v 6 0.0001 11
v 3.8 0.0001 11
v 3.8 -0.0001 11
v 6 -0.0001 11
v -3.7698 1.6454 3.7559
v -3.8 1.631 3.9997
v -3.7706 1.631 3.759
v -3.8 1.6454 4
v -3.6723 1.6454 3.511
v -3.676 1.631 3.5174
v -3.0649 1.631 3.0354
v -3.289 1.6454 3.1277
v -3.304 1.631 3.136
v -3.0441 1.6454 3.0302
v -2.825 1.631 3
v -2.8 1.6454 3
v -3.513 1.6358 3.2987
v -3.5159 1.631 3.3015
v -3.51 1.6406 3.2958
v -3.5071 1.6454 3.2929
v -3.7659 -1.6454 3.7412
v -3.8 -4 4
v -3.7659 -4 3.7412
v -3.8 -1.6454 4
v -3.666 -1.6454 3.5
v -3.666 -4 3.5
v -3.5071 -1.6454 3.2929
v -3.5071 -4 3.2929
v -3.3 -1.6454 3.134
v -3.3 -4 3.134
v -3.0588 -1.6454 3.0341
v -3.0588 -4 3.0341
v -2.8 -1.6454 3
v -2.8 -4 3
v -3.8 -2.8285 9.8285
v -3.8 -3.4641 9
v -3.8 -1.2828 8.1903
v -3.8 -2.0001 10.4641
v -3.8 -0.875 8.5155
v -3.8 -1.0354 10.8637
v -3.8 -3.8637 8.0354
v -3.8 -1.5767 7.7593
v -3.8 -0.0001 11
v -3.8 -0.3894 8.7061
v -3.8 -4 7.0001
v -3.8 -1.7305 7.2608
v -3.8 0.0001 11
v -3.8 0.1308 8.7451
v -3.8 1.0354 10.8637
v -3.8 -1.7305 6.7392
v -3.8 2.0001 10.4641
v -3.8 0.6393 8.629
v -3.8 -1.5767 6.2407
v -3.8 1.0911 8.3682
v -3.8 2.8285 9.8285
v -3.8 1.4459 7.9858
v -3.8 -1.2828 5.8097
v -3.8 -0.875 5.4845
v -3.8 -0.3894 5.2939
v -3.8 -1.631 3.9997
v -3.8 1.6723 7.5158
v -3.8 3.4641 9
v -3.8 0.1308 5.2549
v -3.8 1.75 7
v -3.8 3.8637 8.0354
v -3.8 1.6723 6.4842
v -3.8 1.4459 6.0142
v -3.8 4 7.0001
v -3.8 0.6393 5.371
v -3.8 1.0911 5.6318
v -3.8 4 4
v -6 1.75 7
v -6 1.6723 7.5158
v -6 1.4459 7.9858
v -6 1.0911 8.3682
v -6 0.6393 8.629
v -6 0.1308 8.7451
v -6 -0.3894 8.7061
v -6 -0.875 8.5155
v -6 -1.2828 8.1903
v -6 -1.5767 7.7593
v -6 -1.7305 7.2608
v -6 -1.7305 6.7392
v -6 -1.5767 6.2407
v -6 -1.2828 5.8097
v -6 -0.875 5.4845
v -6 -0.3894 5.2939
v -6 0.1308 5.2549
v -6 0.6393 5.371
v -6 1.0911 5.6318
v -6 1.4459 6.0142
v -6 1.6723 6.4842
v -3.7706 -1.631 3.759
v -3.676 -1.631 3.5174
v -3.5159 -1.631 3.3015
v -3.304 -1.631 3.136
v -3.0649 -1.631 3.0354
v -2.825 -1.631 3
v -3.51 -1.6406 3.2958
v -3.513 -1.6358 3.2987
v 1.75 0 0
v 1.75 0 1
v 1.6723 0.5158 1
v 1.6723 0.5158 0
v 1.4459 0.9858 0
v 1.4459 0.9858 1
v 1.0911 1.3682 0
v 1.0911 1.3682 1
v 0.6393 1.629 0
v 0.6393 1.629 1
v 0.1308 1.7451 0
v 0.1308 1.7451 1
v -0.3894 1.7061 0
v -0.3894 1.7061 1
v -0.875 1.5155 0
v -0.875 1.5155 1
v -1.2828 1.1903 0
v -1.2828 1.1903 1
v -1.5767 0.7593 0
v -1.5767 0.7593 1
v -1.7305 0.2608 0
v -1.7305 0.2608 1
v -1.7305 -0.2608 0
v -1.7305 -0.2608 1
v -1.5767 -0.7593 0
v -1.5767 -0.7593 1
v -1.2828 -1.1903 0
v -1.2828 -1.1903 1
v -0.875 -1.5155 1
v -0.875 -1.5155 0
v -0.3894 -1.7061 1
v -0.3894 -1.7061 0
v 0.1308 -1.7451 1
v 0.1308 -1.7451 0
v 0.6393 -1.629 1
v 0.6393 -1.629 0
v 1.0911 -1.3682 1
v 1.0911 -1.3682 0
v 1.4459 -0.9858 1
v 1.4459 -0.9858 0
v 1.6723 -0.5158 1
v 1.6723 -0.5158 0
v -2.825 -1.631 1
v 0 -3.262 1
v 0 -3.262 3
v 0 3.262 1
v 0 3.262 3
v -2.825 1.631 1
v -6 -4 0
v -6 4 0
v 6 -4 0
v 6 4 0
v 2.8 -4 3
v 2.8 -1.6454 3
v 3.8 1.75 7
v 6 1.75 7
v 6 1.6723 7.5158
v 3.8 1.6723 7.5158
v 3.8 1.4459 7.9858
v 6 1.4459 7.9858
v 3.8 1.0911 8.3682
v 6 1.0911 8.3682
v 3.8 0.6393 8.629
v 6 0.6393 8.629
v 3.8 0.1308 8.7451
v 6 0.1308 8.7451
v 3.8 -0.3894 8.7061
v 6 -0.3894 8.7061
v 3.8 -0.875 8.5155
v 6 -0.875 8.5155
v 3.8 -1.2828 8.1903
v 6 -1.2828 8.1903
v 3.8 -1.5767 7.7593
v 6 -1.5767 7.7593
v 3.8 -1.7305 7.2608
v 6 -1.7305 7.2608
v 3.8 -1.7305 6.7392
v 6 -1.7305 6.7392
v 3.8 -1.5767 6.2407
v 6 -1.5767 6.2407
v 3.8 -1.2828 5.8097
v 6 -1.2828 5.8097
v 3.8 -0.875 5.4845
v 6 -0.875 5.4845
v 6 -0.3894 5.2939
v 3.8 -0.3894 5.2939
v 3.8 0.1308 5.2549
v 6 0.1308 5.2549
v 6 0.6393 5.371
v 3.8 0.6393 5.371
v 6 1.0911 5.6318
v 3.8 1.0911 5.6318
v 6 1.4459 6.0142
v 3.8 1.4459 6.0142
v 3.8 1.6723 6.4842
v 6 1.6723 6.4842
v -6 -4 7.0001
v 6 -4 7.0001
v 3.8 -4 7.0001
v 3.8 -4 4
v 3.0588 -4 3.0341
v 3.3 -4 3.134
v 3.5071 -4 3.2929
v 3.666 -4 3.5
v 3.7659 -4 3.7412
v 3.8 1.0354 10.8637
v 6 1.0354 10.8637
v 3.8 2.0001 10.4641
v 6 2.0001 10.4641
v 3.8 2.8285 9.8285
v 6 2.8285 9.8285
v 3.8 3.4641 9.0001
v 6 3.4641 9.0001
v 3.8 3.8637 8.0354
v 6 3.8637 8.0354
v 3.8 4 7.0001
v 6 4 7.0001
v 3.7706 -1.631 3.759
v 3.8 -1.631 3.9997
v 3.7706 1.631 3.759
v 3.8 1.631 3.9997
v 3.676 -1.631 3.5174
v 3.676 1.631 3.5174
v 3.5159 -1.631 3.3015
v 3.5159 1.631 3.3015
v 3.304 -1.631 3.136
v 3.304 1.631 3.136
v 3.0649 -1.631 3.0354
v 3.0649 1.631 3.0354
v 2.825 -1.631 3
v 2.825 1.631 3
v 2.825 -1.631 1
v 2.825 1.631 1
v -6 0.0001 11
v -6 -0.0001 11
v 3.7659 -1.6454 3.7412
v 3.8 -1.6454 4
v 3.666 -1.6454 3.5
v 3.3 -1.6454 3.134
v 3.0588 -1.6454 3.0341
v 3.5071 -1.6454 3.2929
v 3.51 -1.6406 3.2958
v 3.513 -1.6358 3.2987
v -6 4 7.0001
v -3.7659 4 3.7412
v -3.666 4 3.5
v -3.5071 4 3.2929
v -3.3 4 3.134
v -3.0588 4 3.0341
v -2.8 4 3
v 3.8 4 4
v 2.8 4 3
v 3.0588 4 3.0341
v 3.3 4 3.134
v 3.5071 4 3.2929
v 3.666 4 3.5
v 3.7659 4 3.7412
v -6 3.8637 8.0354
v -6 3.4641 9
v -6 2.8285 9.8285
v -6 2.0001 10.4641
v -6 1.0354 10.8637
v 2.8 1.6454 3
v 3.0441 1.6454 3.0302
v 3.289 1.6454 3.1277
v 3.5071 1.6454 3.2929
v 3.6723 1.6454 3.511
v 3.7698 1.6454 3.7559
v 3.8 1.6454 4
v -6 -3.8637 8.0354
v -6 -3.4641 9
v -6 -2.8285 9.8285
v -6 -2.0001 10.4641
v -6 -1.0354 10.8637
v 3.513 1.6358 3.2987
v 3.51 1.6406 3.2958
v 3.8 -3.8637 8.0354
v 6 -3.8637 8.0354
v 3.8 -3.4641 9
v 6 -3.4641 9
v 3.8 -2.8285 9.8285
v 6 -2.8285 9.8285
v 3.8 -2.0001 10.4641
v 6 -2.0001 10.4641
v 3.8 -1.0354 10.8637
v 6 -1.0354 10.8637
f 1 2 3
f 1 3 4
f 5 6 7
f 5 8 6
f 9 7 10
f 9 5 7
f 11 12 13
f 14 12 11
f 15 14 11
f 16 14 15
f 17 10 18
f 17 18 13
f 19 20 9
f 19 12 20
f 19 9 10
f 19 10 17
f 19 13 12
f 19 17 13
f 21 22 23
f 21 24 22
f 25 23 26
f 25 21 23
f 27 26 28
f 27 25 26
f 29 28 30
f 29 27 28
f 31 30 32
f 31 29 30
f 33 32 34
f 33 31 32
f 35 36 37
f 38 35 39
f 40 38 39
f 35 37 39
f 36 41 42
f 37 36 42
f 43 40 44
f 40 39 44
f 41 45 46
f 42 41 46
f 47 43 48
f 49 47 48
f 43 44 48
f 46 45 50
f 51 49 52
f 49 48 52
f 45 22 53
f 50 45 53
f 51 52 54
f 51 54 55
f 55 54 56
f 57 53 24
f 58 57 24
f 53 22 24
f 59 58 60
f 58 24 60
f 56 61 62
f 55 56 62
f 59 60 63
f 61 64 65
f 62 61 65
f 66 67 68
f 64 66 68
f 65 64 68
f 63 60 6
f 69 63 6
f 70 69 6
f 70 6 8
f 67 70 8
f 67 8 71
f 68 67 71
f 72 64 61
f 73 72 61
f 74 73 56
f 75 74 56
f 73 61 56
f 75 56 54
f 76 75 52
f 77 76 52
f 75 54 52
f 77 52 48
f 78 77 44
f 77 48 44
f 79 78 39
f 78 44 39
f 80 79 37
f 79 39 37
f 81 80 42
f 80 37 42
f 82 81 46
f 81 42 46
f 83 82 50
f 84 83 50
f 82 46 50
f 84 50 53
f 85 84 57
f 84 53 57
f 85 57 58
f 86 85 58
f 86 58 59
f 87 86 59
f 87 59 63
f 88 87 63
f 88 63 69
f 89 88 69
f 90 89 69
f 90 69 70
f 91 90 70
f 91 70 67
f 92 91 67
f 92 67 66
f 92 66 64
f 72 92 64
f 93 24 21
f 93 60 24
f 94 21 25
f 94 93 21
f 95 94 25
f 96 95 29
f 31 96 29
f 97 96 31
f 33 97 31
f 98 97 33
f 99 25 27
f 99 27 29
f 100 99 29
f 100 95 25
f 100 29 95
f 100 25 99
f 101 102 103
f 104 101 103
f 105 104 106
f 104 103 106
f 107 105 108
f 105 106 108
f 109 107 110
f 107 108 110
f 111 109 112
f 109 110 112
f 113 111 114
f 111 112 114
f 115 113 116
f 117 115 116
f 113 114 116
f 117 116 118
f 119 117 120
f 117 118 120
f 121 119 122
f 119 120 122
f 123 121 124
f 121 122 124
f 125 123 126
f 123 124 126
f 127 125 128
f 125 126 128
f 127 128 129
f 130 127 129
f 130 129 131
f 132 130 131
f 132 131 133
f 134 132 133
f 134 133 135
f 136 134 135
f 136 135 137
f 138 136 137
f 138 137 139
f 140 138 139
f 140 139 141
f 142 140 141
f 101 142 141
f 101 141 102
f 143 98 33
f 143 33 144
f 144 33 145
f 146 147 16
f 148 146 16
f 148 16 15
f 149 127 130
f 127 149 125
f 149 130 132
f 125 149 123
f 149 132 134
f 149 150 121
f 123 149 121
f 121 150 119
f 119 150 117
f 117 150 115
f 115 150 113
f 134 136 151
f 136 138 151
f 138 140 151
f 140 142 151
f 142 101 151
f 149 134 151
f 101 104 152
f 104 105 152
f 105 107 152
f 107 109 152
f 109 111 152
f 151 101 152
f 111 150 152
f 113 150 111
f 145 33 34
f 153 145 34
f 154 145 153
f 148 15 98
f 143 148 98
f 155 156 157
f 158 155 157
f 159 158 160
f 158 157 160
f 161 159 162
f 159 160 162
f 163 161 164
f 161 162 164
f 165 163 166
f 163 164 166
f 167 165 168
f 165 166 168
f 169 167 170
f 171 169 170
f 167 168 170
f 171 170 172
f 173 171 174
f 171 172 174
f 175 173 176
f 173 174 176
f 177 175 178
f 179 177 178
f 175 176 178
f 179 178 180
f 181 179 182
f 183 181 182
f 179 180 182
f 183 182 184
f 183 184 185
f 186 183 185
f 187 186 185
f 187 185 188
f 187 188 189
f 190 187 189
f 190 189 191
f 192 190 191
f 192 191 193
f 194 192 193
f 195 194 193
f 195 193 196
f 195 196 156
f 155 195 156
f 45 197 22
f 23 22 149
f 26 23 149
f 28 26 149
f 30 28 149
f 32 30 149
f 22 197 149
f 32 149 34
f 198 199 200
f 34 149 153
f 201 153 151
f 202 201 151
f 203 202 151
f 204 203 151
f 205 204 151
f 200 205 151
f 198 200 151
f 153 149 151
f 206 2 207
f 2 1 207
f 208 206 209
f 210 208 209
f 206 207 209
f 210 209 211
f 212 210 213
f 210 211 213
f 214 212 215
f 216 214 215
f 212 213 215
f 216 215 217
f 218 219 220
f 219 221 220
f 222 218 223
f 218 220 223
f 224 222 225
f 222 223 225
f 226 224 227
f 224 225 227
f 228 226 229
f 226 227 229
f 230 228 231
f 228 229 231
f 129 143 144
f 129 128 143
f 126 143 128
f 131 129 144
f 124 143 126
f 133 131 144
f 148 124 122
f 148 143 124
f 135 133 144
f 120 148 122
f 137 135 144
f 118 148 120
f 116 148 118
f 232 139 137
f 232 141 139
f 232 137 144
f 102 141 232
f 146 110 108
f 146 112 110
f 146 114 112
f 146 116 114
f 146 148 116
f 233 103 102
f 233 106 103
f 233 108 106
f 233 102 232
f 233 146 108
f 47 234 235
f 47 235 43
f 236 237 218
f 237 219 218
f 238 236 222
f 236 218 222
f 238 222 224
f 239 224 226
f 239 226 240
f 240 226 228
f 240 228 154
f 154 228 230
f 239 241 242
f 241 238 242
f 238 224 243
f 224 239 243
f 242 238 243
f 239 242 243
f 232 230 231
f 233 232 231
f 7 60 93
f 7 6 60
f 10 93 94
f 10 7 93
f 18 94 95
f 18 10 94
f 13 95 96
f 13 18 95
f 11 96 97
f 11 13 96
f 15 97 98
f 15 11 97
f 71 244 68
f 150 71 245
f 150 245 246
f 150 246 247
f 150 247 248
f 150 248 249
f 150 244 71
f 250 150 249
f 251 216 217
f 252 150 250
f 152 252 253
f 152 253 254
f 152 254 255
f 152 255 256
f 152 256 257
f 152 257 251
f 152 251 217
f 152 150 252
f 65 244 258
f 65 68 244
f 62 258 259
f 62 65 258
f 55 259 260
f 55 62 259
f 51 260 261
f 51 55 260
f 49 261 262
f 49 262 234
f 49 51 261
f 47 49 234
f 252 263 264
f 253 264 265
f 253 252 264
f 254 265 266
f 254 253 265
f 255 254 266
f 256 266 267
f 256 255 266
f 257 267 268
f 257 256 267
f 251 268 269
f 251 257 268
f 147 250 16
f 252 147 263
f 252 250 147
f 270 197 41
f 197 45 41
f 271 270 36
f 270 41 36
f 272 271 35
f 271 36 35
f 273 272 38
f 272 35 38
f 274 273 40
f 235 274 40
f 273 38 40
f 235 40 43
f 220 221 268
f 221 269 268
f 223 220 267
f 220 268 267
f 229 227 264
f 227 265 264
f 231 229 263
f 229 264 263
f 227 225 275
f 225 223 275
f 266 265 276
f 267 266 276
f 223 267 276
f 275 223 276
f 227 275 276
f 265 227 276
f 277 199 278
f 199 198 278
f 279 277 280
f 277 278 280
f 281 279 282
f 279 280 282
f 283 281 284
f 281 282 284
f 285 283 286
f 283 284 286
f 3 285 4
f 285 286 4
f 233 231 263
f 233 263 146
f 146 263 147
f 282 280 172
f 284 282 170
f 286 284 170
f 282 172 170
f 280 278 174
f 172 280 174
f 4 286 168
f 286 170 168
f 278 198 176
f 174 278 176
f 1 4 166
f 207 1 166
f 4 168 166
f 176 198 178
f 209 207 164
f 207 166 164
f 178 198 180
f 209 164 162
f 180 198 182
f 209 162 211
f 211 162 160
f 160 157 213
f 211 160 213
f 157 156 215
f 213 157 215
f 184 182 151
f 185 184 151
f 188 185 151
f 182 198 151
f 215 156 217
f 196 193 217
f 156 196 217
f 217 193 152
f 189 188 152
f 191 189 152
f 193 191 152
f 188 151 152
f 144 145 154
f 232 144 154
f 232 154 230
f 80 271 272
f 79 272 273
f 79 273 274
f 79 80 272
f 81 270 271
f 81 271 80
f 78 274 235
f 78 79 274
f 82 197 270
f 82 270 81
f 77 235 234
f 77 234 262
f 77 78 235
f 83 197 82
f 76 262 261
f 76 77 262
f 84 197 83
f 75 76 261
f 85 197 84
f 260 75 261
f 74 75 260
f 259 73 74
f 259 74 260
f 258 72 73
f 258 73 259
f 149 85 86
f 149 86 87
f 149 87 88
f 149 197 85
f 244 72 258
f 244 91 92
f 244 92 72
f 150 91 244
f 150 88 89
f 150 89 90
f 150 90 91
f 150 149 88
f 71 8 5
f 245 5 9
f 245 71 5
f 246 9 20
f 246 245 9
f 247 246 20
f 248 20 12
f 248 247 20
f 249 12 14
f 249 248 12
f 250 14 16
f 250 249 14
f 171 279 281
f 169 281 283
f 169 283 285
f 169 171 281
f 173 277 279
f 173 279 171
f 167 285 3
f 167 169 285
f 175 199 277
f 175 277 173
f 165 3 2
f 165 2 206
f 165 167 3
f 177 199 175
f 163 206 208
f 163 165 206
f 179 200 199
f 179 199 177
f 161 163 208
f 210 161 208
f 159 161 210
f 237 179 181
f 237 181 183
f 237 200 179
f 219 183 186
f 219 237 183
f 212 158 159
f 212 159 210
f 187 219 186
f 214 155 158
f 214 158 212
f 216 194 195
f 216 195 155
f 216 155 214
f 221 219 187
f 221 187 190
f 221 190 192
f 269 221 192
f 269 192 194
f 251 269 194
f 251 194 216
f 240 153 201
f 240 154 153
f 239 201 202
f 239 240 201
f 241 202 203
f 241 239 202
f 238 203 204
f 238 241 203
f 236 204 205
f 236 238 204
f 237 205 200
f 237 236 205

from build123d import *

# Parameters (mm, degrees)
SKETCH_1_W          = 12
SKETCH_1_H          = 8
EXTRUDE_1_DEPTH     = 3
CUT_EXTRUDE_1_DEPTH = 2
SKETCH_3_R          = 1.75
CUT_EXTRUDE_2_DEPTH = 2
SKETCH_4_W          = 2.2
SKETCH_4_H          = 8
EXTRUDE_2_DEPTH     = 8
FILLET_1_R          = 4
SKETCH_5_R          = 1.75
CUT_EXTRUDE_3_DEPTH = 17.763054614
FILLET_2_R          = 1


with BuildPart() as part:
    # Эскиз1 → Бобышка-Вытянуть1 (new body)
    with BuildSketch(Plane.XY):
        Rectangle(SKETCH_1_W, SKETCH_1_H)
    extrude(amount=EXTRUDE_1_DEPTH)

    # Эскиз2 → Вырез-Вытянуть1 (cut)
    with BuildSketch(Plane.XY.offset(3)):
        Polygon((2.825, -1.63101451), (2.825, 1.63101451), (0, 3.262029021), (-2.825, 1.63101451), (-2.825, -1.63101451), (0, -3.262029021), align=None)
    extrude(amount=-CUT_EXTRUDE_1_DEPTH, mode=Mode.SUBTRACT)

    # Эскиз3 → Вырез-Вытянуть2 (cut)
    with BuildSketch(Plane.XY.offset(1)):
        Circle(SKETCH_3_R)
    extrude(amount=-CUT_EXTRUDE_2_DEPTH, mode=Mode.SUBTRACT)

    # Эскиз4 → Бобышка-Вытянуть2 (add)
    with BuildSketch(Plane.XY.offset(3)):
        with Locations((-4.9, 0)):
            Rectangle(SKETCH_4_W, SKETCH_4_H)
        with Locations((4.9, 0)):
            Rectangle(SKETCH_4_W, SKETCH_4_H)
    extrude(amount=EXTRUDE_2_DEPTH)

    # Скругление1
    fillet_1_edges = [part.edges().sort_by_distance(p)[0] for p in [
        (4.9, 4, 11),
        (-4.9, 4, 11),
        (4.9, -4, 11),
        (-4.9, -4, 11),
    ]]
    fillet(fillet_1_edges, radius=FILLET_1_R - 0.0001)  # a hair under: the kernel refuses the full size

    # Эскиз5 → Вырез-Вытянуть3 (cut, through all)
    with BuildSketch(Plane(origin=(6, 0, 0), x_dir=(0, 0, -1), z_dir=(1, 0, 0))):
        with Locations(Location((-7, 0, 0), (0, 0, 90))):
            Circle(SKETCH_5_R)
    extrude(amount=-CUT_EXTRUDE_3_DEPTH, mode=Mode.SUBTRACT)

    # Скругление2
    fillet_2_edges = [part.edges().sort_by_distance(p)[0] for p in [
        (-3.8, 0, 3),
        (3.8, 0, 3),
    ]]
    fillet(fillet_2_edges, radius=FILLET_2_R)


solid = part.part
